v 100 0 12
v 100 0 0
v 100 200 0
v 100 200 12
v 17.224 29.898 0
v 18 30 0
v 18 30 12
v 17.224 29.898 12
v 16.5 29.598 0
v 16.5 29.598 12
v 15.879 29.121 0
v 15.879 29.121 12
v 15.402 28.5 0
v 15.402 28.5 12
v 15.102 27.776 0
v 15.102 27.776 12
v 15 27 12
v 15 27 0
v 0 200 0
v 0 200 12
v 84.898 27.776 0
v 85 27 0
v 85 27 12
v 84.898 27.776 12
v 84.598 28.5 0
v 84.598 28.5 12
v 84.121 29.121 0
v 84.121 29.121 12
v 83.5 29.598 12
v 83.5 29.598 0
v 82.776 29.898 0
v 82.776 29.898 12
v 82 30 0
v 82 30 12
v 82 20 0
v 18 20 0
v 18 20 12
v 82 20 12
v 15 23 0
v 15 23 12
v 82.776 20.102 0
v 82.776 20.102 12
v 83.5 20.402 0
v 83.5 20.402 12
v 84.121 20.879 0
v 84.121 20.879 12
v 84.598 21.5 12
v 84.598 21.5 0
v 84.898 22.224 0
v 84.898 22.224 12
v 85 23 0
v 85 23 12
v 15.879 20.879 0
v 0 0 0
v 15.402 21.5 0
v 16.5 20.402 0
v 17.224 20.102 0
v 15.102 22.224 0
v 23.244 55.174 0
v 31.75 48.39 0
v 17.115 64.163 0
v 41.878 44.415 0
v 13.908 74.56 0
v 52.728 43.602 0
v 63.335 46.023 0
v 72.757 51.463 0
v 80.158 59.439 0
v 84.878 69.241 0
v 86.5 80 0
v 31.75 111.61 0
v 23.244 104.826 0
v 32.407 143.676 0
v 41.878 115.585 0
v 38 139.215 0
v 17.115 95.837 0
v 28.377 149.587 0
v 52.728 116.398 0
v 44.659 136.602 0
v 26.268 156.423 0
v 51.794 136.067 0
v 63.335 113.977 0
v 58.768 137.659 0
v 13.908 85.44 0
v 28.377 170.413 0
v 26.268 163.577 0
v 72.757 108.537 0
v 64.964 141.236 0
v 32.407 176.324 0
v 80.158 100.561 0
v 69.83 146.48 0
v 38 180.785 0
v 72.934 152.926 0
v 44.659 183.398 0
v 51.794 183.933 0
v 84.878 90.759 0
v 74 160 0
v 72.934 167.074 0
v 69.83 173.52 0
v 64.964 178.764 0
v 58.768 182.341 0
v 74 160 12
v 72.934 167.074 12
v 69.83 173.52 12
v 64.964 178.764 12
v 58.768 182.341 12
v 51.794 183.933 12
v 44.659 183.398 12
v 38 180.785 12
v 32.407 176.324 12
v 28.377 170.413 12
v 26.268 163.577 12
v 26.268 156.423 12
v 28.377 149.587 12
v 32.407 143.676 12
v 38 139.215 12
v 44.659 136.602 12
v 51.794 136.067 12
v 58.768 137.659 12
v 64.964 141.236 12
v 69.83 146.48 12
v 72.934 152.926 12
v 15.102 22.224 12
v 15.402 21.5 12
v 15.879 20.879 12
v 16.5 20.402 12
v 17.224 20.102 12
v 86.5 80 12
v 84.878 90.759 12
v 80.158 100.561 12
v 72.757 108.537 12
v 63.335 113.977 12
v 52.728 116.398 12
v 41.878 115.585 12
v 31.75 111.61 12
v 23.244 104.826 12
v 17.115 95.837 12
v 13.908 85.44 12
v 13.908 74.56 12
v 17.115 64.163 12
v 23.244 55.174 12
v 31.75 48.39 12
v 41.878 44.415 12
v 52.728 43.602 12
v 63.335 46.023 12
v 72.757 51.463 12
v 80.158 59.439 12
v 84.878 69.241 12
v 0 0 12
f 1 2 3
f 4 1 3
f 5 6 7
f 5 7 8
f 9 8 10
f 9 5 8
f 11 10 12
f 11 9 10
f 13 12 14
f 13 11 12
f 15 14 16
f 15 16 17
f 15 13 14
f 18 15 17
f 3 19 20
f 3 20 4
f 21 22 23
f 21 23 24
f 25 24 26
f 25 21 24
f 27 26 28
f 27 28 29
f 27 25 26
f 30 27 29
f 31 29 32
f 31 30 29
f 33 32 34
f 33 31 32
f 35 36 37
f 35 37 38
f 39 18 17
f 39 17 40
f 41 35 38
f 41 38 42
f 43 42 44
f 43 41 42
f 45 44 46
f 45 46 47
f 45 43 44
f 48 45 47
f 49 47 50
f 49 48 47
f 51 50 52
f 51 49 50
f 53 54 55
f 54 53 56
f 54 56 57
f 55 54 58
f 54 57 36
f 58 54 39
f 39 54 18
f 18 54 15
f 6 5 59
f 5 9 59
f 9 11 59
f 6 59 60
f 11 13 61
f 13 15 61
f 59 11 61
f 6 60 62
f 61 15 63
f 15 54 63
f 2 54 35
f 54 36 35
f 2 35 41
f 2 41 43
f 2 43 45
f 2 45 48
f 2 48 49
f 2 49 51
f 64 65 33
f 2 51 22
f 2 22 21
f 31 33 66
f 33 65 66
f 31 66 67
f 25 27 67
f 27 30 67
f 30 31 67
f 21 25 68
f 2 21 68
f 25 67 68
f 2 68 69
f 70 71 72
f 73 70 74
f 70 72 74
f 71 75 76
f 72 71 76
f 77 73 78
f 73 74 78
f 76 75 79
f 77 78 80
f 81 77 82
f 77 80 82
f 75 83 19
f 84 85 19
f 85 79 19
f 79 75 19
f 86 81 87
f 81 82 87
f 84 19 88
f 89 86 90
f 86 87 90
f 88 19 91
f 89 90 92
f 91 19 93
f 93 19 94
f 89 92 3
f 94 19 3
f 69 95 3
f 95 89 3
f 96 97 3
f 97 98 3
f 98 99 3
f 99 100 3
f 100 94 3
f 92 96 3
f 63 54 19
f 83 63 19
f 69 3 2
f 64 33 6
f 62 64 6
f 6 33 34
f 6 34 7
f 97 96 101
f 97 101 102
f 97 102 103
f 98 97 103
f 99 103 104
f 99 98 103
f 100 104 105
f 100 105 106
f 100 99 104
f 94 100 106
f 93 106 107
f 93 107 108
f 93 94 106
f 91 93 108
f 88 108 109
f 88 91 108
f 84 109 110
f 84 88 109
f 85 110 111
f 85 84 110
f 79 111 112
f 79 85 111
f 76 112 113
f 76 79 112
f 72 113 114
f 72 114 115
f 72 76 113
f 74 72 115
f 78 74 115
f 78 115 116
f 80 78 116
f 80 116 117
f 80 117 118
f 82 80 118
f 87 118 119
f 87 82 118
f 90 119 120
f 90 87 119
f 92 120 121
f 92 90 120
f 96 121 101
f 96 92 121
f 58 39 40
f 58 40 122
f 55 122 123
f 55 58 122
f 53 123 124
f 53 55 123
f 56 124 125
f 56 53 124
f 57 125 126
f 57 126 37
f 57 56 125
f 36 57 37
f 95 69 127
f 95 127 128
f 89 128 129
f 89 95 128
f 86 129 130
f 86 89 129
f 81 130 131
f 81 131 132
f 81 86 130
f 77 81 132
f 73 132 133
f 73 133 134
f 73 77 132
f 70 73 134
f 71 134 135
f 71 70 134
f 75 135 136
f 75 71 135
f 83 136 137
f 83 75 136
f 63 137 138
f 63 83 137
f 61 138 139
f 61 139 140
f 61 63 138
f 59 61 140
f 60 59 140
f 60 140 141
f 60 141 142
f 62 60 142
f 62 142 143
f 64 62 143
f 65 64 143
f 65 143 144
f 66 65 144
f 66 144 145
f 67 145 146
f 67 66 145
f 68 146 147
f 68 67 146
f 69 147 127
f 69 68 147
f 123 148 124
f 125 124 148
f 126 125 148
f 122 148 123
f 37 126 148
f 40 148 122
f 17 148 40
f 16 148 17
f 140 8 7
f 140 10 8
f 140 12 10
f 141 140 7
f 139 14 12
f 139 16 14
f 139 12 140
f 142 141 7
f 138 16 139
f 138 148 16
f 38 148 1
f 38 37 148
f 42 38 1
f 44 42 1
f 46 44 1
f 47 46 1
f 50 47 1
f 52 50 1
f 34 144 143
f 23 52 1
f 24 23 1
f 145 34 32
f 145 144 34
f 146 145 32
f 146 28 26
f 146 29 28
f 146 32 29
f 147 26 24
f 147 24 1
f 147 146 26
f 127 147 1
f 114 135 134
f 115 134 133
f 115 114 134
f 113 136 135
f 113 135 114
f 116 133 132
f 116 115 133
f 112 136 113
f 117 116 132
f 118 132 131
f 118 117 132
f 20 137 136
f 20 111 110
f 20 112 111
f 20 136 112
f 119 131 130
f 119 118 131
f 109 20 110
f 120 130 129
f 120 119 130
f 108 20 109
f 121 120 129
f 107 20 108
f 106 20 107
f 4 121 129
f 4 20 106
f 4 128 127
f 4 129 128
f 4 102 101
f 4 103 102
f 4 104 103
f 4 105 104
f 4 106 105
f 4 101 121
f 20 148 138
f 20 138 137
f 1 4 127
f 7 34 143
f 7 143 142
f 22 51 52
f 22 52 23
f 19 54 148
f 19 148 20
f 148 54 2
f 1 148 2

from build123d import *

# Parameters (mm, degrees)
SKETCH_W   = 100
SKETCH_H   = 200
SKETCH_R   = 36.5
SKETCH_R_2 = 24
PAD_DEPTH  = 12


with BuildPart() as part:
    # Sketch → Pad (new body)
    with BuildSketch(Plane.XY):
        with Locations((50, 100)):
            Rectangle(SKETCH_W, SKETCH_H)
        with Locations((50, 80)):
            Circle(SKETCH_R, mode=Mode.SUBTRACT)
        with Locations((50, 160)):
            Circle(SKETCH_R_2, mode=Mode.SUBTRACT)
        with BuildLine():
            Line((18, 20), (82, 20))
            ThreePointArc((82, 20), (84.12132, 20.87868), (85, 23))
            Line((85, 23), (85, 27))
            ThreePointArc((85, 27), (84.12132, 29.12132), (82, 30))
            Line((82, 30), (18, 30))
            ThreePointArc((18, 30), (15.87868, 29.12132), (15, 27))
            Line((15, 27), (15, 23))
            ThreePointArc((15, 23), (15.87868, 20.87868), (18, 20))
        make_face(mode=Mode.SUBTRACT)
    extrude(amount=PAD_DEPTH)


solid = part.part
